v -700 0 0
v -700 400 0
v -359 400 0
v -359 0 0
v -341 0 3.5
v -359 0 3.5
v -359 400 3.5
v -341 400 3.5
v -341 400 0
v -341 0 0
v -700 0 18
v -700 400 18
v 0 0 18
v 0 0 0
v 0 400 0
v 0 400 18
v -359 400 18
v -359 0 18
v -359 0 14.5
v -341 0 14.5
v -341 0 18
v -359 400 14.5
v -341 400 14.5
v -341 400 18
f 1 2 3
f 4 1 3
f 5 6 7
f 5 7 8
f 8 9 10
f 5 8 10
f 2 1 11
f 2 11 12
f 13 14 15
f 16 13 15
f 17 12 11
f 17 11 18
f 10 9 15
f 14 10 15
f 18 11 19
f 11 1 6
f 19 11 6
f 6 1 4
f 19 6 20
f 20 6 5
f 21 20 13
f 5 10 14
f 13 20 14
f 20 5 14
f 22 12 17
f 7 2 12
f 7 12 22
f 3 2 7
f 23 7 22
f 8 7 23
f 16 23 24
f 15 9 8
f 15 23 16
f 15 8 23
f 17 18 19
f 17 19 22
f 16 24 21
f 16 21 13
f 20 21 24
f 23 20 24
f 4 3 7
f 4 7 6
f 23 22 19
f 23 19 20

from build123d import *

# Parameters (mm, degrees)
SKETCH_W        = 700
SKETCH_H        = 400
PAD_DEPTH       = 18
PAD001_DEPTH    = 18
SKETCH001_W     = 18
SKETCH001_H     = 400
POCKET_DEPTH    = 3.5
SKETCH002_W     = 18
SKETCH002_H     = 400
POCKET001_DEPTH = 3.5


with BuildPart() as part:
    # Sketch → Pad (new body)
    with BuildSketch(Plane.XY):
        with Locations((-350, 200)):
            Rectangle(SKETCH_W, SKETCH_H)
    extrude(amount=PAD_DEPTH)

    # Sketch → Pad001 (join)
    with BuildSketch(Plane.XY):
        with Locations((-350, 200)):
            Rectangle(SKETCH_W, SKETCH_H)
    extrude(amount=PAD001_DEPTH)

    # Sketch001 (on Face5 of Pad001) → Pocket (cut)
    with BuildSketch(Plane.XY.offset(18)):
        with Locations((-350, 200)):
            Rectangle(SKETCH001_W, SKETCH001_H)
    extrude(amount=-POCKET_DEPTH, mode=Mode.SUBTRACT)

    # Sketch002 (on Face2 of Pocket) → Pocket001 (cut)
    with BuildSketch(Plane(origin=(0, 0, 0), x_dir=(1, 0, 0), z_dir=(0, 0, -1))):
        with Locations((-350, -200)):
            Rectangle(SKETCH002_W, SKETCH002_H)
    extrude(amount=-POCKET001_DEPTH, mode=Mode.SUBTRACT)


solid = part.part
